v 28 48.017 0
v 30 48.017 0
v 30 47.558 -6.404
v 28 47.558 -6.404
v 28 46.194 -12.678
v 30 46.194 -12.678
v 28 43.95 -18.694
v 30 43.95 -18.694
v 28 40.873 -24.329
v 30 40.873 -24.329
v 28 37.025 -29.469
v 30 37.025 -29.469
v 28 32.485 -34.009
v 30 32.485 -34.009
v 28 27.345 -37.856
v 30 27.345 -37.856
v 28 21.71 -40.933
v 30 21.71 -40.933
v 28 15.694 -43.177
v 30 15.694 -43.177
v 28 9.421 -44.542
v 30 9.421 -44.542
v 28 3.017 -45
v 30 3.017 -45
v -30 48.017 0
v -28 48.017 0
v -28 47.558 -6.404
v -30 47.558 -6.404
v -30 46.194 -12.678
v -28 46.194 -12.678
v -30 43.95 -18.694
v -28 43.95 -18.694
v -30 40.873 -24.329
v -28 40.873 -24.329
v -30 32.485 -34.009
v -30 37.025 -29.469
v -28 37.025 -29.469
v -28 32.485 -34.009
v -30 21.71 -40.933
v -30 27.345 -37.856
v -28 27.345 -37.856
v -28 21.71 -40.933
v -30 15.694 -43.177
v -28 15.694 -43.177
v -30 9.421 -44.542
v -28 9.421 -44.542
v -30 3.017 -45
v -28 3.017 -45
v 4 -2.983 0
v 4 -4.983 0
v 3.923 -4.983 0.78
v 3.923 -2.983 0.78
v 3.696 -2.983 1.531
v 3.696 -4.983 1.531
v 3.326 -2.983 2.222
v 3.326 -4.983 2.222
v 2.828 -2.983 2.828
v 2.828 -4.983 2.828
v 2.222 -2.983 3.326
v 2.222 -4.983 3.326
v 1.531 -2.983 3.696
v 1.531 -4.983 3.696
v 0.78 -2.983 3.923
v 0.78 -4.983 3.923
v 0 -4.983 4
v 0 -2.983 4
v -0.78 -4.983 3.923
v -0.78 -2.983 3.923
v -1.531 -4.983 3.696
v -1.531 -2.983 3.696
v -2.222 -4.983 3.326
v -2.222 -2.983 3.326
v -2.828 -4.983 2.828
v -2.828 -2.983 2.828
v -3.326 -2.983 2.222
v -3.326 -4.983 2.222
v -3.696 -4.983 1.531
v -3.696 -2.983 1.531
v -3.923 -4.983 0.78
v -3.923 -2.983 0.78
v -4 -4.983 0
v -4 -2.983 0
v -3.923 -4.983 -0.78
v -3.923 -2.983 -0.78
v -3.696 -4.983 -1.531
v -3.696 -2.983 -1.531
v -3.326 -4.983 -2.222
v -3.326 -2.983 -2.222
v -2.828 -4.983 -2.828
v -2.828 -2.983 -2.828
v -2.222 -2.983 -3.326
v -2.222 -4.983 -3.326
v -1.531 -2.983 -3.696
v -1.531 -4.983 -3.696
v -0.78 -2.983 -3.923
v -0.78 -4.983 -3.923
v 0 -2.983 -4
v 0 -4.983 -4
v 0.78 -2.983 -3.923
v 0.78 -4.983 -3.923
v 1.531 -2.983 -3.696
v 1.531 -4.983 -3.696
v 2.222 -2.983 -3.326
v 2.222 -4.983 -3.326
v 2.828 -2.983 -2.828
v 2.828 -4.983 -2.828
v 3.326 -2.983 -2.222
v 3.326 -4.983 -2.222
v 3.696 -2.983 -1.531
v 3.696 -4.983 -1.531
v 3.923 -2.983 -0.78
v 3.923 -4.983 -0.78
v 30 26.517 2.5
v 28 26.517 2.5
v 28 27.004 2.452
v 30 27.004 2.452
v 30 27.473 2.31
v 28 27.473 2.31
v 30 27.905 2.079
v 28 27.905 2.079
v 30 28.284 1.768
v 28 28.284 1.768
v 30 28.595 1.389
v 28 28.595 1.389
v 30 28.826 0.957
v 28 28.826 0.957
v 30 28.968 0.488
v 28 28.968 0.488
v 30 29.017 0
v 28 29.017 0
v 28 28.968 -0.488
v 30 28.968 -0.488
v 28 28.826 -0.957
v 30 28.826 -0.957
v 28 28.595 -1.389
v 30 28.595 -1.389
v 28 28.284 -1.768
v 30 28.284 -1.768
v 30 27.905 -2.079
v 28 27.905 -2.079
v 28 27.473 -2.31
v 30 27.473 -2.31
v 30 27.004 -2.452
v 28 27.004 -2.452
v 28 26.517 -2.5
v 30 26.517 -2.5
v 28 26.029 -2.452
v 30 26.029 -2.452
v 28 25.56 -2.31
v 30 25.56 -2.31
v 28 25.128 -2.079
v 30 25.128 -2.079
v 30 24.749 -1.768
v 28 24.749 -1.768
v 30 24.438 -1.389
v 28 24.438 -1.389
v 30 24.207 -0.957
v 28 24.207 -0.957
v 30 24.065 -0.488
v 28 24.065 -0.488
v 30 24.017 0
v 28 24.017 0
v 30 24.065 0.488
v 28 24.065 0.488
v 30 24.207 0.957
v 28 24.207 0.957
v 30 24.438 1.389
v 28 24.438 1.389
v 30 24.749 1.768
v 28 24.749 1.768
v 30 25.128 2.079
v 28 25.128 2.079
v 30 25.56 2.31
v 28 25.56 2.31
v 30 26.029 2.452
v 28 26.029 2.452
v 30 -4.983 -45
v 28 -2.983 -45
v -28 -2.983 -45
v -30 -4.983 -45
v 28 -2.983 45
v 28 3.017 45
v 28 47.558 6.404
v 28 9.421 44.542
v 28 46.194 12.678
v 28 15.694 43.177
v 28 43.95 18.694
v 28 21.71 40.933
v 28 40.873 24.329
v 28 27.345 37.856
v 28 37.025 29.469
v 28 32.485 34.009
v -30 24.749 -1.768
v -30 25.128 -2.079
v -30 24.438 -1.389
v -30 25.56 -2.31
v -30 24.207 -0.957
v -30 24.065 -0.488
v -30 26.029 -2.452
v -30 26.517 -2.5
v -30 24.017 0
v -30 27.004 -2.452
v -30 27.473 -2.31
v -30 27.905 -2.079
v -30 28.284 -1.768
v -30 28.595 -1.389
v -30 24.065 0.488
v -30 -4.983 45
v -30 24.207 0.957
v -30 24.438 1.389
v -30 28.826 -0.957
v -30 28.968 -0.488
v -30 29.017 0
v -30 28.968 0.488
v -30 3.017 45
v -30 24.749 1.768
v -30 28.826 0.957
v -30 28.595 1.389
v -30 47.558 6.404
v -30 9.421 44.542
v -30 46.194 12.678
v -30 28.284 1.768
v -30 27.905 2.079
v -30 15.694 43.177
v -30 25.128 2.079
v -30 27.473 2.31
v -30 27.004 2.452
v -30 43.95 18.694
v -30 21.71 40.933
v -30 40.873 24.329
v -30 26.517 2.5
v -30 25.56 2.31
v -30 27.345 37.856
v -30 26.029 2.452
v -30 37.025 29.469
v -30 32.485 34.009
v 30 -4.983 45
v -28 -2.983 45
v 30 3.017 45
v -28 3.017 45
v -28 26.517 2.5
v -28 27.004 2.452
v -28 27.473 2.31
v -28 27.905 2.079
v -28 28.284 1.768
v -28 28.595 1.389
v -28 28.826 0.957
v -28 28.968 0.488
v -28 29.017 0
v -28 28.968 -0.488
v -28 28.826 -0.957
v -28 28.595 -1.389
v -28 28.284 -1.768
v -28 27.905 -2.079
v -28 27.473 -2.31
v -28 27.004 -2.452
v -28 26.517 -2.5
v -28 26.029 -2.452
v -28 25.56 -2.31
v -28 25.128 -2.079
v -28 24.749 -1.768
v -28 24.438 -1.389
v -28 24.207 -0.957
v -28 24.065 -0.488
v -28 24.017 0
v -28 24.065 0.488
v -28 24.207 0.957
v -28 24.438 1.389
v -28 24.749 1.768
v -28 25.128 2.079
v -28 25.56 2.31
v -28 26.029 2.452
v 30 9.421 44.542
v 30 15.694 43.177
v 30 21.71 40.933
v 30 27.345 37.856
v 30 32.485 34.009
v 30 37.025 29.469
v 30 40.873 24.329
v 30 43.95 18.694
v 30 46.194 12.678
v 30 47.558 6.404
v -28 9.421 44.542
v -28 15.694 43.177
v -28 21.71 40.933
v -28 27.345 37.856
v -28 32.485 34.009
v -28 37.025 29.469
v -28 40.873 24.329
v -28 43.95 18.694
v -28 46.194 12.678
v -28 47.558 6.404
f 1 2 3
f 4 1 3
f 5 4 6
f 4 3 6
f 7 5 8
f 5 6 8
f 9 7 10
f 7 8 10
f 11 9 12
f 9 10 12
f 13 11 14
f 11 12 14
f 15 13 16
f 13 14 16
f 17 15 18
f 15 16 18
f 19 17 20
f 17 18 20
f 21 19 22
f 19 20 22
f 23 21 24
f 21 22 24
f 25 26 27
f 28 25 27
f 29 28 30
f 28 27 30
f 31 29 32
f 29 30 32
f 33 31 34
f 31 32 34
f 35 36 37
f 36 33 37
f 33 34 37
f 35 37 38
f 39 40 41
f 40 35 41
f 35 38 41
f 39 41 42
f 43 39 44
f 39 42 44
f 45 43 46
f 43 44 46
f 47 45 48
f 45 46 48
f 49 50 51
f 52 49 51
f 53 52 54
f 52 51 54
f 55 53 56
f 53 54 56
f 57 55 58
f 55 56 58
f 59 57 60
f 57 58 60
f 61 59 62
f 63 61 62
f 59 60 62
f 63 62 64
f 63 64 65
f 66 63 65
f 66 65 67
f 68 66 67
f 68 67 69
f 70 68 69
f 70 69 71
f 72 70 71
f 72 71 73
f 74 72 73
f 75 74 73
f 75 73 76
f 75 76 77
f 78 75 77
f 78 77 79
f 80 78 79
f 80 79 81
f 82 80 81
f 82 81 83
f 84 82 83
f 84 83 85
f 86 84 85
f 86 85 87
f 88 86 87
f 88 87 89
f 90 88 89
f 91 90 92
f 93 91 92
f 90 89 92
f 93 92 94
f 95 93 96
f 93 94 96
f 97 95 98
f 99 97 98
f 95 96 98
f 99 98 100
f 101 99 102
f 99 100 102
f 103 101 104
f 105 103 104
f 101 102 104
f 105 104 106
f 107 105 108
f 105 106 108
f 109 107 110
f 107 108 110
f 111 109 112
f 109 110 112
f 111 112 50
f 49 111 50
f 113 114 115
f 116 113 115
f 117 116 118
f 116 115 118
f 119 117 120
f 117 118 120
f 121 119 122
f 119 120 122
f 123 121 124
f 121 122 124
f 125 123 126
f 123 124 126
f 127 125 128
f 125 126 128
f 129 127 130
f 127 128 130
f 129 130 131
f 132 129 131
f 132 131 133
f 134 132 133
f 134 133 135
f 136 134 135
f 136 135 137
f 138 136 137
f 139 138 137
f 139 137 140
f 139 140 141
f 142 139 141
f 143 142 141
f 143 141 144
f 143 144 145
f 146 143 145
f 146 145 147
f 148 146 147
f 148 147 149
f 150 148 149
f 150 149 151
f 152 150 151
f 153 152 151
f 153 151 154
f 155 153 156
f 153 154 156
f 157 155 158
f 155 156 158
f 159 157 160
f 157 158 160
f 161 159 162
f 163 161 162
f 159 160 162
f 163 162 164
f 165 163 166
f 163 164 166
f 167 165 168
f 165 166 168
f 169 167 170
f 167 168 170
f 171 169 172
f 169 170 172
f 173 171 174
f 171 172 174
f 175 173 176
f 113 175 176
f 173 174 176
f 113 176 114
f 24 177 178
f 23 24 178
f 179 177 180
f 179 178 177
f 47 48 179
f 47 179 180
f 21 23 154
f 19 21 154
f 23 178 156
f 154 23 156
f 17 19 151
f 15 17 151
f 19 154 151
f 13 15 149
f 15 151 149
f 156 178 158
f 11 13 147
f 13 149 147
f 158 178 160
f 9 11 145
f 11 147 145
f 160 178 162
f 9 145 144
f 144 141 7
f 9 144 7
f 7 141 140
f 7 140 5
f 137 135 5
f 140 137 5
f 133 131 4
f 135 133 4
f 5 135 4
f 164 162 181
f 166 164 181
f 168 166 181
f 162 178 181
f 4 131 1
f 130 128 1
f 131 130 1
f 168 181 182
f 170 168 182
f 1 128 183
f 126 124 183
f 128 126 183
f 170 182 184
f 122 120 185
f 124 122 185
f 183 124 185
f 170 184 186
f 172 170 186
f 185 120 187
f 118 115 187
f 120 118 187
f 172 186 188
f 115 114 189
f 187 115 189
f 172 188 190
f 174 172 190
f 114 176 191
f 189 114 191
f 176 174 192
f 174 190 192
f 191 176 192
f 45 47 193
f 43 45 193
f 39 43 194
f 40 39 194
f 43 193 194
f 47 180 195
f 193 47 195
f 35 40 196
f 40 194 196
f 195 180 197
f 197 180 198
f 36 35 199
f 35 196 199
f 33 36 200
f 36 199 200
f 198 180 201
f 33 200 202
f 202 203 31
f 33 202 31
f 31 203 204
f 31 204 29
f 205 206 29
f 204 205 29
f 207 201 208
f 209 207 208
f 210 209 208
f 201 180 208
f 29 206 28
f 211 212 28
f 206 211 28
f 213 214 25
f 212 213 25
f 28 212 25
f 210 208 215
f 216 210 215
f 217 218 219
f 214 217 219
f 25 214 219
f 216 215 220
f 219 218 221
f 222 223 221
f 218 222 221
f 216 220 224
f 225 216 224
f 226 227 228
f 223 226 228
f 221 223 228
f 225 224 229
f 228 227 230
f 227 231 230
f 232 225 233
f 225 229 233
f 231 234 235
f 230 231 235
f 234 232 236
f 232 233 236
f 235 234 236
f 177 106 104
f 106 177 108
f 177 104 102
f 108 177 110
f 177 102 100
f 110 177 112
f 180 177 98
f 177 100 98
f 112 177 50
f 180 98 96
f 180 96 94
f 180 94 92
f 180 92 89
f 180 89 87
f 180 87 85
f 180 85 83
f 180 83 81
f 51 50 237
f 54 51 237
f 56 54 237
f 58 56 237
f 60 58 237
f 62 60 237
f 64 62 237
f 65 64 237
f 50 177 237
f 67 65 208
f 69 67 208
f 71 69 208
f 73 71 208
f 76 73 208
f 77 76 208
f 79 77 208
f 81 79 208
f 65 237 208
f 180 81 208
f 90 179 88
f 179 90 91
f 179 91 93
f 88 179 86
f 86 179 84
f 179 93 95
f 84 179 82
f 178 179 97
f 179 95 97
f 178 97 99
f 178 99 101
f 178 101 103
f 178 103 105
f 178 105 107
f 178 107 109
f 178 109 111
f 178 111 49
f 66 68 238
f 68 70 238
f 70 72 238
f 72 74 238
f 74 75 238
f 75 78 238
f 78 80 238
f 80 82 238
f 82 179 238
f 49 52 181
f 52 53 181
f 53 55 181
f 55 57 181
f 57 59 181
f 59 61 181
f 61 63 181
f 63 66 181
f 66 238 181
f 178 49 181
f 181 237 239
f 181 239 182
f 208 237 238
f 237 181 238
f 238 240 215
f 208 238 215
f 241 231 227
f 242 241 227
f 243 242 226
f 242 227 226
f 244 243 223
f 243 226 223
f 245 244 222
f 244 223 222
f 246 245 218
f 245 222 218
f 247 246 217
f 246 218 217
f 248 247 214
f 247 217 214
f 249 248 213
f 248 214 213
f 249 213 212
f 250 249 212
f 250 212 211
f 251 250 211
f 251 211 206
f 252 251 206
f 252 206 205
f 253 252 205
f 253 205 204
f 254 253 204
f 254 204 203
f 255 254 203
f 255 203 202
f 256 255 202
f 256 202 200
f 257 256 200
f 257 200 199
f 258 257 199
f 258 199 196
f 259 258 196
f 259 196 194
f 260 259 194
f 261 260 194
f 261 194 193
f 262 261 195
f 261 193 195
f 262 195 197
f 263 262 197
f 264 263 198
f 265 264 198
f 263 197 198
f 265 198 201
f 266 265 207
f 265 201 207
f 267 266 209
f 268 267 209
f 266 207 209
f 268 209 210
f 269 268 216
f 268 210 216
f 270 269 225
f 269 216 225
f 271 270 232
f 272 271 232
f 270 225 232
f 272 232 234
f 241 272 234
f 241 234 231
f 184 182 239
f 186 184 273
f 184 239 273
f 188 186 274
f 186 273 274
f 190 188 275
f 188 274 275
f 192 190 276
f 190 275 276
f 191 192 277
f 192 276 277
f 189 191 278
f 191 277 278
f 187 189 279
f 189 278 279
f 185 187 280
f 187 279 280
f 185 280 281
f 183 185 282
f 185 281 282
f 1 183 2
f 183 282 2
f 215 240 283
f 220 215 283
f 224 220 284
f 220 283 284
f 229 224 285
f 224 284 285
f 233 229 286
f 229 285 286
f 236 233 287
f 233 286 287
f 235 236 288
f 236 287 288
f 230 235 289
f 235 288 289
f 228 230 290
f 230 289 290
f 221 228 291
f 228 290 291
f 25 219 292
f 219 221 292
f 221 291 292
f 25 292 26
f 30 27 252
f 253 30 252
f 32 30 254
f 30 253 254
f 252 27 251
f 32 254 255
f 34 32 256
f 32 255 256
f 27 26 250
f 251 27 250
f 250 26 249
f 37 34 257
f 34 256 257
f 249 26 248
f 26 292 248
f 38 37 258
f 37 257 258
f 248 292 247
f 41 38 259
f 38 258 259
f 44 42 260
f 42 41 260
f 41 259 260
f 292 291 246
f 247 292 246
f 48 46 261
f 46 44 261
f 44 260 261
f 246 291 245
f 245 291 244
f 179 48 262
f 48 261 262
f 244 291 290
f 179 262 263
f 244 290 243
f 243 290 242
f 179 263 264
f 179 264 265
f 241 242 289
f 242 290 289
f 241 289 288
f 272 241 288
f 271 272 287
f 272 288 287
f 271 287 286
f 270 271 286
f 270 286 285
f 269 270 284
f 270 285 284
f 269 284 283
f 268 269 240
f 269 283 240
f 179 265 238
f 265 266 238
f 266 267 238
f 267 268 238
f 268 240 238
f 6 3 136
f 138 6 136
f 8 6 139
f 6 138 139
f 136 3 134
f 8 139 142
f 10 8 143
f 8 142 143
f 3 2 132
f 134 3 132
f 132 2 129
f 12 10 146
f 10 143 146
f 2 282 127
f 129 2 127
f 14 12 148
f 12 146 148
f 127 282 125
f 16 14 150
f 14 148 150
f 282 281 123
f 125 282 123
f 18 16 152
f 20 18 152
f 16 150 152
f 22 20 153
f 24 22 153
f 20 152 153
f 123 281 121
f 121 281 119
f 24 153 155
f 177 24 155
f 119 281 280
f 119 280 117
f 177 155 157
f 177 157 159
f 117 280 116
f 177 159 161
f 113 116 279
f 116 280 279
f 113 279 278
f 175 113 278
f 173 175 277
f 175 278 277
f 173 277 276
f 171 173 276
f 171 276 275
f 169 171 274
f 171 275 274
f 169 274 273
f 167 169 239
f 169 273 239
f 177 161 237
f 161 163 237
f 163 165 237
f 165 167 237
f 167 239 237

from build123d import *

# Parameters (mm, degrees)
EXTRUDE_1_DEPTH      = 45
EXTRUDE_1_DEPTH_BACK = 45
CUT_EXTRUDE_1_DEPTH  = 90.053829869
SKETCH_4_R           = 2.5
CUT_EXTRUDE_2_DEPTH  = 90.053829869
SKETCH_5_R           = 4
CUT_EXTRUDE_3_DEPTH  = 50


with BuildPart() as part:
    # 草图1 → 凸台-拉伸1 (new, two sides: drawn at the far end of the back side and taken through both)
    with BuildSketch(Plane.XY.offset(-EXTRUDE_1_DEPTH_BACK)):
        Polygon((30, -4.983496438), (-30, -4.983496438), (-30, 48.016503562), (-28, 48.016503562), (-28, -2.983496438), (28, -2.983496438), (28, 48.016503562), (30, 48.016503562), align=None)
    extrude(amount=EXTRUDE_1_DEPTH + EXTRUDE_1_DEPTH_BACK)

    # 草图3 → 切除-拉伸1 (cut, through all)
    with BuildSketch(Plane(origin=(30, 0, 0), x_dir=(0, 0, -1), z_dir=(1, 0, 0))):
        with BuildLine():
            Line((45, 48.016503562), (9.2e-08, 48.016503562))
            ThreePointArc((9.2e-08, 48.016503562), (31.819805186, 34.836308683), (45, 3.016503562))
            Line((45, 3.016503562), (45, 48.016503562))
        make_face()
        with BuildLine():
            Line((-45, 48.016503562), (-45, 3.016503562))
            ThreePointArc((-45, 3.016503562), (-31.819805121, 34.836308748), (9.2e-08, 48.016503562))
            Line((9.2e-08, 48.016503562), (-45, 48.016503562))
        make_face()
    extrude(amount=-CUT_EXTRUDE_1_DEPTH, mode=Mode.SUBTRACT)

    # 草图4 → 切除-拉伸2 (cut, through all)
    with BuildSketch(Plane.ZY.offset(30)):
        with Locations((0, 26.516503562)):
            Circle(SKETCH_4_R)
    extrude(amount=-CUT_EXTRUDE_2_DEPTH, mode=Mode.SUBTRACT)

    # 草图5 → 切除-拉伸3 (cut)
    with BuildSketch(Plane.XZ.offset(4.983496438)):
        Circle(SKETCH_5_R)
    extrude(amount=-CUT_EXTRUDE_3_DEPTH, mode=Mode.SUBTRACT)


solid = part.part
